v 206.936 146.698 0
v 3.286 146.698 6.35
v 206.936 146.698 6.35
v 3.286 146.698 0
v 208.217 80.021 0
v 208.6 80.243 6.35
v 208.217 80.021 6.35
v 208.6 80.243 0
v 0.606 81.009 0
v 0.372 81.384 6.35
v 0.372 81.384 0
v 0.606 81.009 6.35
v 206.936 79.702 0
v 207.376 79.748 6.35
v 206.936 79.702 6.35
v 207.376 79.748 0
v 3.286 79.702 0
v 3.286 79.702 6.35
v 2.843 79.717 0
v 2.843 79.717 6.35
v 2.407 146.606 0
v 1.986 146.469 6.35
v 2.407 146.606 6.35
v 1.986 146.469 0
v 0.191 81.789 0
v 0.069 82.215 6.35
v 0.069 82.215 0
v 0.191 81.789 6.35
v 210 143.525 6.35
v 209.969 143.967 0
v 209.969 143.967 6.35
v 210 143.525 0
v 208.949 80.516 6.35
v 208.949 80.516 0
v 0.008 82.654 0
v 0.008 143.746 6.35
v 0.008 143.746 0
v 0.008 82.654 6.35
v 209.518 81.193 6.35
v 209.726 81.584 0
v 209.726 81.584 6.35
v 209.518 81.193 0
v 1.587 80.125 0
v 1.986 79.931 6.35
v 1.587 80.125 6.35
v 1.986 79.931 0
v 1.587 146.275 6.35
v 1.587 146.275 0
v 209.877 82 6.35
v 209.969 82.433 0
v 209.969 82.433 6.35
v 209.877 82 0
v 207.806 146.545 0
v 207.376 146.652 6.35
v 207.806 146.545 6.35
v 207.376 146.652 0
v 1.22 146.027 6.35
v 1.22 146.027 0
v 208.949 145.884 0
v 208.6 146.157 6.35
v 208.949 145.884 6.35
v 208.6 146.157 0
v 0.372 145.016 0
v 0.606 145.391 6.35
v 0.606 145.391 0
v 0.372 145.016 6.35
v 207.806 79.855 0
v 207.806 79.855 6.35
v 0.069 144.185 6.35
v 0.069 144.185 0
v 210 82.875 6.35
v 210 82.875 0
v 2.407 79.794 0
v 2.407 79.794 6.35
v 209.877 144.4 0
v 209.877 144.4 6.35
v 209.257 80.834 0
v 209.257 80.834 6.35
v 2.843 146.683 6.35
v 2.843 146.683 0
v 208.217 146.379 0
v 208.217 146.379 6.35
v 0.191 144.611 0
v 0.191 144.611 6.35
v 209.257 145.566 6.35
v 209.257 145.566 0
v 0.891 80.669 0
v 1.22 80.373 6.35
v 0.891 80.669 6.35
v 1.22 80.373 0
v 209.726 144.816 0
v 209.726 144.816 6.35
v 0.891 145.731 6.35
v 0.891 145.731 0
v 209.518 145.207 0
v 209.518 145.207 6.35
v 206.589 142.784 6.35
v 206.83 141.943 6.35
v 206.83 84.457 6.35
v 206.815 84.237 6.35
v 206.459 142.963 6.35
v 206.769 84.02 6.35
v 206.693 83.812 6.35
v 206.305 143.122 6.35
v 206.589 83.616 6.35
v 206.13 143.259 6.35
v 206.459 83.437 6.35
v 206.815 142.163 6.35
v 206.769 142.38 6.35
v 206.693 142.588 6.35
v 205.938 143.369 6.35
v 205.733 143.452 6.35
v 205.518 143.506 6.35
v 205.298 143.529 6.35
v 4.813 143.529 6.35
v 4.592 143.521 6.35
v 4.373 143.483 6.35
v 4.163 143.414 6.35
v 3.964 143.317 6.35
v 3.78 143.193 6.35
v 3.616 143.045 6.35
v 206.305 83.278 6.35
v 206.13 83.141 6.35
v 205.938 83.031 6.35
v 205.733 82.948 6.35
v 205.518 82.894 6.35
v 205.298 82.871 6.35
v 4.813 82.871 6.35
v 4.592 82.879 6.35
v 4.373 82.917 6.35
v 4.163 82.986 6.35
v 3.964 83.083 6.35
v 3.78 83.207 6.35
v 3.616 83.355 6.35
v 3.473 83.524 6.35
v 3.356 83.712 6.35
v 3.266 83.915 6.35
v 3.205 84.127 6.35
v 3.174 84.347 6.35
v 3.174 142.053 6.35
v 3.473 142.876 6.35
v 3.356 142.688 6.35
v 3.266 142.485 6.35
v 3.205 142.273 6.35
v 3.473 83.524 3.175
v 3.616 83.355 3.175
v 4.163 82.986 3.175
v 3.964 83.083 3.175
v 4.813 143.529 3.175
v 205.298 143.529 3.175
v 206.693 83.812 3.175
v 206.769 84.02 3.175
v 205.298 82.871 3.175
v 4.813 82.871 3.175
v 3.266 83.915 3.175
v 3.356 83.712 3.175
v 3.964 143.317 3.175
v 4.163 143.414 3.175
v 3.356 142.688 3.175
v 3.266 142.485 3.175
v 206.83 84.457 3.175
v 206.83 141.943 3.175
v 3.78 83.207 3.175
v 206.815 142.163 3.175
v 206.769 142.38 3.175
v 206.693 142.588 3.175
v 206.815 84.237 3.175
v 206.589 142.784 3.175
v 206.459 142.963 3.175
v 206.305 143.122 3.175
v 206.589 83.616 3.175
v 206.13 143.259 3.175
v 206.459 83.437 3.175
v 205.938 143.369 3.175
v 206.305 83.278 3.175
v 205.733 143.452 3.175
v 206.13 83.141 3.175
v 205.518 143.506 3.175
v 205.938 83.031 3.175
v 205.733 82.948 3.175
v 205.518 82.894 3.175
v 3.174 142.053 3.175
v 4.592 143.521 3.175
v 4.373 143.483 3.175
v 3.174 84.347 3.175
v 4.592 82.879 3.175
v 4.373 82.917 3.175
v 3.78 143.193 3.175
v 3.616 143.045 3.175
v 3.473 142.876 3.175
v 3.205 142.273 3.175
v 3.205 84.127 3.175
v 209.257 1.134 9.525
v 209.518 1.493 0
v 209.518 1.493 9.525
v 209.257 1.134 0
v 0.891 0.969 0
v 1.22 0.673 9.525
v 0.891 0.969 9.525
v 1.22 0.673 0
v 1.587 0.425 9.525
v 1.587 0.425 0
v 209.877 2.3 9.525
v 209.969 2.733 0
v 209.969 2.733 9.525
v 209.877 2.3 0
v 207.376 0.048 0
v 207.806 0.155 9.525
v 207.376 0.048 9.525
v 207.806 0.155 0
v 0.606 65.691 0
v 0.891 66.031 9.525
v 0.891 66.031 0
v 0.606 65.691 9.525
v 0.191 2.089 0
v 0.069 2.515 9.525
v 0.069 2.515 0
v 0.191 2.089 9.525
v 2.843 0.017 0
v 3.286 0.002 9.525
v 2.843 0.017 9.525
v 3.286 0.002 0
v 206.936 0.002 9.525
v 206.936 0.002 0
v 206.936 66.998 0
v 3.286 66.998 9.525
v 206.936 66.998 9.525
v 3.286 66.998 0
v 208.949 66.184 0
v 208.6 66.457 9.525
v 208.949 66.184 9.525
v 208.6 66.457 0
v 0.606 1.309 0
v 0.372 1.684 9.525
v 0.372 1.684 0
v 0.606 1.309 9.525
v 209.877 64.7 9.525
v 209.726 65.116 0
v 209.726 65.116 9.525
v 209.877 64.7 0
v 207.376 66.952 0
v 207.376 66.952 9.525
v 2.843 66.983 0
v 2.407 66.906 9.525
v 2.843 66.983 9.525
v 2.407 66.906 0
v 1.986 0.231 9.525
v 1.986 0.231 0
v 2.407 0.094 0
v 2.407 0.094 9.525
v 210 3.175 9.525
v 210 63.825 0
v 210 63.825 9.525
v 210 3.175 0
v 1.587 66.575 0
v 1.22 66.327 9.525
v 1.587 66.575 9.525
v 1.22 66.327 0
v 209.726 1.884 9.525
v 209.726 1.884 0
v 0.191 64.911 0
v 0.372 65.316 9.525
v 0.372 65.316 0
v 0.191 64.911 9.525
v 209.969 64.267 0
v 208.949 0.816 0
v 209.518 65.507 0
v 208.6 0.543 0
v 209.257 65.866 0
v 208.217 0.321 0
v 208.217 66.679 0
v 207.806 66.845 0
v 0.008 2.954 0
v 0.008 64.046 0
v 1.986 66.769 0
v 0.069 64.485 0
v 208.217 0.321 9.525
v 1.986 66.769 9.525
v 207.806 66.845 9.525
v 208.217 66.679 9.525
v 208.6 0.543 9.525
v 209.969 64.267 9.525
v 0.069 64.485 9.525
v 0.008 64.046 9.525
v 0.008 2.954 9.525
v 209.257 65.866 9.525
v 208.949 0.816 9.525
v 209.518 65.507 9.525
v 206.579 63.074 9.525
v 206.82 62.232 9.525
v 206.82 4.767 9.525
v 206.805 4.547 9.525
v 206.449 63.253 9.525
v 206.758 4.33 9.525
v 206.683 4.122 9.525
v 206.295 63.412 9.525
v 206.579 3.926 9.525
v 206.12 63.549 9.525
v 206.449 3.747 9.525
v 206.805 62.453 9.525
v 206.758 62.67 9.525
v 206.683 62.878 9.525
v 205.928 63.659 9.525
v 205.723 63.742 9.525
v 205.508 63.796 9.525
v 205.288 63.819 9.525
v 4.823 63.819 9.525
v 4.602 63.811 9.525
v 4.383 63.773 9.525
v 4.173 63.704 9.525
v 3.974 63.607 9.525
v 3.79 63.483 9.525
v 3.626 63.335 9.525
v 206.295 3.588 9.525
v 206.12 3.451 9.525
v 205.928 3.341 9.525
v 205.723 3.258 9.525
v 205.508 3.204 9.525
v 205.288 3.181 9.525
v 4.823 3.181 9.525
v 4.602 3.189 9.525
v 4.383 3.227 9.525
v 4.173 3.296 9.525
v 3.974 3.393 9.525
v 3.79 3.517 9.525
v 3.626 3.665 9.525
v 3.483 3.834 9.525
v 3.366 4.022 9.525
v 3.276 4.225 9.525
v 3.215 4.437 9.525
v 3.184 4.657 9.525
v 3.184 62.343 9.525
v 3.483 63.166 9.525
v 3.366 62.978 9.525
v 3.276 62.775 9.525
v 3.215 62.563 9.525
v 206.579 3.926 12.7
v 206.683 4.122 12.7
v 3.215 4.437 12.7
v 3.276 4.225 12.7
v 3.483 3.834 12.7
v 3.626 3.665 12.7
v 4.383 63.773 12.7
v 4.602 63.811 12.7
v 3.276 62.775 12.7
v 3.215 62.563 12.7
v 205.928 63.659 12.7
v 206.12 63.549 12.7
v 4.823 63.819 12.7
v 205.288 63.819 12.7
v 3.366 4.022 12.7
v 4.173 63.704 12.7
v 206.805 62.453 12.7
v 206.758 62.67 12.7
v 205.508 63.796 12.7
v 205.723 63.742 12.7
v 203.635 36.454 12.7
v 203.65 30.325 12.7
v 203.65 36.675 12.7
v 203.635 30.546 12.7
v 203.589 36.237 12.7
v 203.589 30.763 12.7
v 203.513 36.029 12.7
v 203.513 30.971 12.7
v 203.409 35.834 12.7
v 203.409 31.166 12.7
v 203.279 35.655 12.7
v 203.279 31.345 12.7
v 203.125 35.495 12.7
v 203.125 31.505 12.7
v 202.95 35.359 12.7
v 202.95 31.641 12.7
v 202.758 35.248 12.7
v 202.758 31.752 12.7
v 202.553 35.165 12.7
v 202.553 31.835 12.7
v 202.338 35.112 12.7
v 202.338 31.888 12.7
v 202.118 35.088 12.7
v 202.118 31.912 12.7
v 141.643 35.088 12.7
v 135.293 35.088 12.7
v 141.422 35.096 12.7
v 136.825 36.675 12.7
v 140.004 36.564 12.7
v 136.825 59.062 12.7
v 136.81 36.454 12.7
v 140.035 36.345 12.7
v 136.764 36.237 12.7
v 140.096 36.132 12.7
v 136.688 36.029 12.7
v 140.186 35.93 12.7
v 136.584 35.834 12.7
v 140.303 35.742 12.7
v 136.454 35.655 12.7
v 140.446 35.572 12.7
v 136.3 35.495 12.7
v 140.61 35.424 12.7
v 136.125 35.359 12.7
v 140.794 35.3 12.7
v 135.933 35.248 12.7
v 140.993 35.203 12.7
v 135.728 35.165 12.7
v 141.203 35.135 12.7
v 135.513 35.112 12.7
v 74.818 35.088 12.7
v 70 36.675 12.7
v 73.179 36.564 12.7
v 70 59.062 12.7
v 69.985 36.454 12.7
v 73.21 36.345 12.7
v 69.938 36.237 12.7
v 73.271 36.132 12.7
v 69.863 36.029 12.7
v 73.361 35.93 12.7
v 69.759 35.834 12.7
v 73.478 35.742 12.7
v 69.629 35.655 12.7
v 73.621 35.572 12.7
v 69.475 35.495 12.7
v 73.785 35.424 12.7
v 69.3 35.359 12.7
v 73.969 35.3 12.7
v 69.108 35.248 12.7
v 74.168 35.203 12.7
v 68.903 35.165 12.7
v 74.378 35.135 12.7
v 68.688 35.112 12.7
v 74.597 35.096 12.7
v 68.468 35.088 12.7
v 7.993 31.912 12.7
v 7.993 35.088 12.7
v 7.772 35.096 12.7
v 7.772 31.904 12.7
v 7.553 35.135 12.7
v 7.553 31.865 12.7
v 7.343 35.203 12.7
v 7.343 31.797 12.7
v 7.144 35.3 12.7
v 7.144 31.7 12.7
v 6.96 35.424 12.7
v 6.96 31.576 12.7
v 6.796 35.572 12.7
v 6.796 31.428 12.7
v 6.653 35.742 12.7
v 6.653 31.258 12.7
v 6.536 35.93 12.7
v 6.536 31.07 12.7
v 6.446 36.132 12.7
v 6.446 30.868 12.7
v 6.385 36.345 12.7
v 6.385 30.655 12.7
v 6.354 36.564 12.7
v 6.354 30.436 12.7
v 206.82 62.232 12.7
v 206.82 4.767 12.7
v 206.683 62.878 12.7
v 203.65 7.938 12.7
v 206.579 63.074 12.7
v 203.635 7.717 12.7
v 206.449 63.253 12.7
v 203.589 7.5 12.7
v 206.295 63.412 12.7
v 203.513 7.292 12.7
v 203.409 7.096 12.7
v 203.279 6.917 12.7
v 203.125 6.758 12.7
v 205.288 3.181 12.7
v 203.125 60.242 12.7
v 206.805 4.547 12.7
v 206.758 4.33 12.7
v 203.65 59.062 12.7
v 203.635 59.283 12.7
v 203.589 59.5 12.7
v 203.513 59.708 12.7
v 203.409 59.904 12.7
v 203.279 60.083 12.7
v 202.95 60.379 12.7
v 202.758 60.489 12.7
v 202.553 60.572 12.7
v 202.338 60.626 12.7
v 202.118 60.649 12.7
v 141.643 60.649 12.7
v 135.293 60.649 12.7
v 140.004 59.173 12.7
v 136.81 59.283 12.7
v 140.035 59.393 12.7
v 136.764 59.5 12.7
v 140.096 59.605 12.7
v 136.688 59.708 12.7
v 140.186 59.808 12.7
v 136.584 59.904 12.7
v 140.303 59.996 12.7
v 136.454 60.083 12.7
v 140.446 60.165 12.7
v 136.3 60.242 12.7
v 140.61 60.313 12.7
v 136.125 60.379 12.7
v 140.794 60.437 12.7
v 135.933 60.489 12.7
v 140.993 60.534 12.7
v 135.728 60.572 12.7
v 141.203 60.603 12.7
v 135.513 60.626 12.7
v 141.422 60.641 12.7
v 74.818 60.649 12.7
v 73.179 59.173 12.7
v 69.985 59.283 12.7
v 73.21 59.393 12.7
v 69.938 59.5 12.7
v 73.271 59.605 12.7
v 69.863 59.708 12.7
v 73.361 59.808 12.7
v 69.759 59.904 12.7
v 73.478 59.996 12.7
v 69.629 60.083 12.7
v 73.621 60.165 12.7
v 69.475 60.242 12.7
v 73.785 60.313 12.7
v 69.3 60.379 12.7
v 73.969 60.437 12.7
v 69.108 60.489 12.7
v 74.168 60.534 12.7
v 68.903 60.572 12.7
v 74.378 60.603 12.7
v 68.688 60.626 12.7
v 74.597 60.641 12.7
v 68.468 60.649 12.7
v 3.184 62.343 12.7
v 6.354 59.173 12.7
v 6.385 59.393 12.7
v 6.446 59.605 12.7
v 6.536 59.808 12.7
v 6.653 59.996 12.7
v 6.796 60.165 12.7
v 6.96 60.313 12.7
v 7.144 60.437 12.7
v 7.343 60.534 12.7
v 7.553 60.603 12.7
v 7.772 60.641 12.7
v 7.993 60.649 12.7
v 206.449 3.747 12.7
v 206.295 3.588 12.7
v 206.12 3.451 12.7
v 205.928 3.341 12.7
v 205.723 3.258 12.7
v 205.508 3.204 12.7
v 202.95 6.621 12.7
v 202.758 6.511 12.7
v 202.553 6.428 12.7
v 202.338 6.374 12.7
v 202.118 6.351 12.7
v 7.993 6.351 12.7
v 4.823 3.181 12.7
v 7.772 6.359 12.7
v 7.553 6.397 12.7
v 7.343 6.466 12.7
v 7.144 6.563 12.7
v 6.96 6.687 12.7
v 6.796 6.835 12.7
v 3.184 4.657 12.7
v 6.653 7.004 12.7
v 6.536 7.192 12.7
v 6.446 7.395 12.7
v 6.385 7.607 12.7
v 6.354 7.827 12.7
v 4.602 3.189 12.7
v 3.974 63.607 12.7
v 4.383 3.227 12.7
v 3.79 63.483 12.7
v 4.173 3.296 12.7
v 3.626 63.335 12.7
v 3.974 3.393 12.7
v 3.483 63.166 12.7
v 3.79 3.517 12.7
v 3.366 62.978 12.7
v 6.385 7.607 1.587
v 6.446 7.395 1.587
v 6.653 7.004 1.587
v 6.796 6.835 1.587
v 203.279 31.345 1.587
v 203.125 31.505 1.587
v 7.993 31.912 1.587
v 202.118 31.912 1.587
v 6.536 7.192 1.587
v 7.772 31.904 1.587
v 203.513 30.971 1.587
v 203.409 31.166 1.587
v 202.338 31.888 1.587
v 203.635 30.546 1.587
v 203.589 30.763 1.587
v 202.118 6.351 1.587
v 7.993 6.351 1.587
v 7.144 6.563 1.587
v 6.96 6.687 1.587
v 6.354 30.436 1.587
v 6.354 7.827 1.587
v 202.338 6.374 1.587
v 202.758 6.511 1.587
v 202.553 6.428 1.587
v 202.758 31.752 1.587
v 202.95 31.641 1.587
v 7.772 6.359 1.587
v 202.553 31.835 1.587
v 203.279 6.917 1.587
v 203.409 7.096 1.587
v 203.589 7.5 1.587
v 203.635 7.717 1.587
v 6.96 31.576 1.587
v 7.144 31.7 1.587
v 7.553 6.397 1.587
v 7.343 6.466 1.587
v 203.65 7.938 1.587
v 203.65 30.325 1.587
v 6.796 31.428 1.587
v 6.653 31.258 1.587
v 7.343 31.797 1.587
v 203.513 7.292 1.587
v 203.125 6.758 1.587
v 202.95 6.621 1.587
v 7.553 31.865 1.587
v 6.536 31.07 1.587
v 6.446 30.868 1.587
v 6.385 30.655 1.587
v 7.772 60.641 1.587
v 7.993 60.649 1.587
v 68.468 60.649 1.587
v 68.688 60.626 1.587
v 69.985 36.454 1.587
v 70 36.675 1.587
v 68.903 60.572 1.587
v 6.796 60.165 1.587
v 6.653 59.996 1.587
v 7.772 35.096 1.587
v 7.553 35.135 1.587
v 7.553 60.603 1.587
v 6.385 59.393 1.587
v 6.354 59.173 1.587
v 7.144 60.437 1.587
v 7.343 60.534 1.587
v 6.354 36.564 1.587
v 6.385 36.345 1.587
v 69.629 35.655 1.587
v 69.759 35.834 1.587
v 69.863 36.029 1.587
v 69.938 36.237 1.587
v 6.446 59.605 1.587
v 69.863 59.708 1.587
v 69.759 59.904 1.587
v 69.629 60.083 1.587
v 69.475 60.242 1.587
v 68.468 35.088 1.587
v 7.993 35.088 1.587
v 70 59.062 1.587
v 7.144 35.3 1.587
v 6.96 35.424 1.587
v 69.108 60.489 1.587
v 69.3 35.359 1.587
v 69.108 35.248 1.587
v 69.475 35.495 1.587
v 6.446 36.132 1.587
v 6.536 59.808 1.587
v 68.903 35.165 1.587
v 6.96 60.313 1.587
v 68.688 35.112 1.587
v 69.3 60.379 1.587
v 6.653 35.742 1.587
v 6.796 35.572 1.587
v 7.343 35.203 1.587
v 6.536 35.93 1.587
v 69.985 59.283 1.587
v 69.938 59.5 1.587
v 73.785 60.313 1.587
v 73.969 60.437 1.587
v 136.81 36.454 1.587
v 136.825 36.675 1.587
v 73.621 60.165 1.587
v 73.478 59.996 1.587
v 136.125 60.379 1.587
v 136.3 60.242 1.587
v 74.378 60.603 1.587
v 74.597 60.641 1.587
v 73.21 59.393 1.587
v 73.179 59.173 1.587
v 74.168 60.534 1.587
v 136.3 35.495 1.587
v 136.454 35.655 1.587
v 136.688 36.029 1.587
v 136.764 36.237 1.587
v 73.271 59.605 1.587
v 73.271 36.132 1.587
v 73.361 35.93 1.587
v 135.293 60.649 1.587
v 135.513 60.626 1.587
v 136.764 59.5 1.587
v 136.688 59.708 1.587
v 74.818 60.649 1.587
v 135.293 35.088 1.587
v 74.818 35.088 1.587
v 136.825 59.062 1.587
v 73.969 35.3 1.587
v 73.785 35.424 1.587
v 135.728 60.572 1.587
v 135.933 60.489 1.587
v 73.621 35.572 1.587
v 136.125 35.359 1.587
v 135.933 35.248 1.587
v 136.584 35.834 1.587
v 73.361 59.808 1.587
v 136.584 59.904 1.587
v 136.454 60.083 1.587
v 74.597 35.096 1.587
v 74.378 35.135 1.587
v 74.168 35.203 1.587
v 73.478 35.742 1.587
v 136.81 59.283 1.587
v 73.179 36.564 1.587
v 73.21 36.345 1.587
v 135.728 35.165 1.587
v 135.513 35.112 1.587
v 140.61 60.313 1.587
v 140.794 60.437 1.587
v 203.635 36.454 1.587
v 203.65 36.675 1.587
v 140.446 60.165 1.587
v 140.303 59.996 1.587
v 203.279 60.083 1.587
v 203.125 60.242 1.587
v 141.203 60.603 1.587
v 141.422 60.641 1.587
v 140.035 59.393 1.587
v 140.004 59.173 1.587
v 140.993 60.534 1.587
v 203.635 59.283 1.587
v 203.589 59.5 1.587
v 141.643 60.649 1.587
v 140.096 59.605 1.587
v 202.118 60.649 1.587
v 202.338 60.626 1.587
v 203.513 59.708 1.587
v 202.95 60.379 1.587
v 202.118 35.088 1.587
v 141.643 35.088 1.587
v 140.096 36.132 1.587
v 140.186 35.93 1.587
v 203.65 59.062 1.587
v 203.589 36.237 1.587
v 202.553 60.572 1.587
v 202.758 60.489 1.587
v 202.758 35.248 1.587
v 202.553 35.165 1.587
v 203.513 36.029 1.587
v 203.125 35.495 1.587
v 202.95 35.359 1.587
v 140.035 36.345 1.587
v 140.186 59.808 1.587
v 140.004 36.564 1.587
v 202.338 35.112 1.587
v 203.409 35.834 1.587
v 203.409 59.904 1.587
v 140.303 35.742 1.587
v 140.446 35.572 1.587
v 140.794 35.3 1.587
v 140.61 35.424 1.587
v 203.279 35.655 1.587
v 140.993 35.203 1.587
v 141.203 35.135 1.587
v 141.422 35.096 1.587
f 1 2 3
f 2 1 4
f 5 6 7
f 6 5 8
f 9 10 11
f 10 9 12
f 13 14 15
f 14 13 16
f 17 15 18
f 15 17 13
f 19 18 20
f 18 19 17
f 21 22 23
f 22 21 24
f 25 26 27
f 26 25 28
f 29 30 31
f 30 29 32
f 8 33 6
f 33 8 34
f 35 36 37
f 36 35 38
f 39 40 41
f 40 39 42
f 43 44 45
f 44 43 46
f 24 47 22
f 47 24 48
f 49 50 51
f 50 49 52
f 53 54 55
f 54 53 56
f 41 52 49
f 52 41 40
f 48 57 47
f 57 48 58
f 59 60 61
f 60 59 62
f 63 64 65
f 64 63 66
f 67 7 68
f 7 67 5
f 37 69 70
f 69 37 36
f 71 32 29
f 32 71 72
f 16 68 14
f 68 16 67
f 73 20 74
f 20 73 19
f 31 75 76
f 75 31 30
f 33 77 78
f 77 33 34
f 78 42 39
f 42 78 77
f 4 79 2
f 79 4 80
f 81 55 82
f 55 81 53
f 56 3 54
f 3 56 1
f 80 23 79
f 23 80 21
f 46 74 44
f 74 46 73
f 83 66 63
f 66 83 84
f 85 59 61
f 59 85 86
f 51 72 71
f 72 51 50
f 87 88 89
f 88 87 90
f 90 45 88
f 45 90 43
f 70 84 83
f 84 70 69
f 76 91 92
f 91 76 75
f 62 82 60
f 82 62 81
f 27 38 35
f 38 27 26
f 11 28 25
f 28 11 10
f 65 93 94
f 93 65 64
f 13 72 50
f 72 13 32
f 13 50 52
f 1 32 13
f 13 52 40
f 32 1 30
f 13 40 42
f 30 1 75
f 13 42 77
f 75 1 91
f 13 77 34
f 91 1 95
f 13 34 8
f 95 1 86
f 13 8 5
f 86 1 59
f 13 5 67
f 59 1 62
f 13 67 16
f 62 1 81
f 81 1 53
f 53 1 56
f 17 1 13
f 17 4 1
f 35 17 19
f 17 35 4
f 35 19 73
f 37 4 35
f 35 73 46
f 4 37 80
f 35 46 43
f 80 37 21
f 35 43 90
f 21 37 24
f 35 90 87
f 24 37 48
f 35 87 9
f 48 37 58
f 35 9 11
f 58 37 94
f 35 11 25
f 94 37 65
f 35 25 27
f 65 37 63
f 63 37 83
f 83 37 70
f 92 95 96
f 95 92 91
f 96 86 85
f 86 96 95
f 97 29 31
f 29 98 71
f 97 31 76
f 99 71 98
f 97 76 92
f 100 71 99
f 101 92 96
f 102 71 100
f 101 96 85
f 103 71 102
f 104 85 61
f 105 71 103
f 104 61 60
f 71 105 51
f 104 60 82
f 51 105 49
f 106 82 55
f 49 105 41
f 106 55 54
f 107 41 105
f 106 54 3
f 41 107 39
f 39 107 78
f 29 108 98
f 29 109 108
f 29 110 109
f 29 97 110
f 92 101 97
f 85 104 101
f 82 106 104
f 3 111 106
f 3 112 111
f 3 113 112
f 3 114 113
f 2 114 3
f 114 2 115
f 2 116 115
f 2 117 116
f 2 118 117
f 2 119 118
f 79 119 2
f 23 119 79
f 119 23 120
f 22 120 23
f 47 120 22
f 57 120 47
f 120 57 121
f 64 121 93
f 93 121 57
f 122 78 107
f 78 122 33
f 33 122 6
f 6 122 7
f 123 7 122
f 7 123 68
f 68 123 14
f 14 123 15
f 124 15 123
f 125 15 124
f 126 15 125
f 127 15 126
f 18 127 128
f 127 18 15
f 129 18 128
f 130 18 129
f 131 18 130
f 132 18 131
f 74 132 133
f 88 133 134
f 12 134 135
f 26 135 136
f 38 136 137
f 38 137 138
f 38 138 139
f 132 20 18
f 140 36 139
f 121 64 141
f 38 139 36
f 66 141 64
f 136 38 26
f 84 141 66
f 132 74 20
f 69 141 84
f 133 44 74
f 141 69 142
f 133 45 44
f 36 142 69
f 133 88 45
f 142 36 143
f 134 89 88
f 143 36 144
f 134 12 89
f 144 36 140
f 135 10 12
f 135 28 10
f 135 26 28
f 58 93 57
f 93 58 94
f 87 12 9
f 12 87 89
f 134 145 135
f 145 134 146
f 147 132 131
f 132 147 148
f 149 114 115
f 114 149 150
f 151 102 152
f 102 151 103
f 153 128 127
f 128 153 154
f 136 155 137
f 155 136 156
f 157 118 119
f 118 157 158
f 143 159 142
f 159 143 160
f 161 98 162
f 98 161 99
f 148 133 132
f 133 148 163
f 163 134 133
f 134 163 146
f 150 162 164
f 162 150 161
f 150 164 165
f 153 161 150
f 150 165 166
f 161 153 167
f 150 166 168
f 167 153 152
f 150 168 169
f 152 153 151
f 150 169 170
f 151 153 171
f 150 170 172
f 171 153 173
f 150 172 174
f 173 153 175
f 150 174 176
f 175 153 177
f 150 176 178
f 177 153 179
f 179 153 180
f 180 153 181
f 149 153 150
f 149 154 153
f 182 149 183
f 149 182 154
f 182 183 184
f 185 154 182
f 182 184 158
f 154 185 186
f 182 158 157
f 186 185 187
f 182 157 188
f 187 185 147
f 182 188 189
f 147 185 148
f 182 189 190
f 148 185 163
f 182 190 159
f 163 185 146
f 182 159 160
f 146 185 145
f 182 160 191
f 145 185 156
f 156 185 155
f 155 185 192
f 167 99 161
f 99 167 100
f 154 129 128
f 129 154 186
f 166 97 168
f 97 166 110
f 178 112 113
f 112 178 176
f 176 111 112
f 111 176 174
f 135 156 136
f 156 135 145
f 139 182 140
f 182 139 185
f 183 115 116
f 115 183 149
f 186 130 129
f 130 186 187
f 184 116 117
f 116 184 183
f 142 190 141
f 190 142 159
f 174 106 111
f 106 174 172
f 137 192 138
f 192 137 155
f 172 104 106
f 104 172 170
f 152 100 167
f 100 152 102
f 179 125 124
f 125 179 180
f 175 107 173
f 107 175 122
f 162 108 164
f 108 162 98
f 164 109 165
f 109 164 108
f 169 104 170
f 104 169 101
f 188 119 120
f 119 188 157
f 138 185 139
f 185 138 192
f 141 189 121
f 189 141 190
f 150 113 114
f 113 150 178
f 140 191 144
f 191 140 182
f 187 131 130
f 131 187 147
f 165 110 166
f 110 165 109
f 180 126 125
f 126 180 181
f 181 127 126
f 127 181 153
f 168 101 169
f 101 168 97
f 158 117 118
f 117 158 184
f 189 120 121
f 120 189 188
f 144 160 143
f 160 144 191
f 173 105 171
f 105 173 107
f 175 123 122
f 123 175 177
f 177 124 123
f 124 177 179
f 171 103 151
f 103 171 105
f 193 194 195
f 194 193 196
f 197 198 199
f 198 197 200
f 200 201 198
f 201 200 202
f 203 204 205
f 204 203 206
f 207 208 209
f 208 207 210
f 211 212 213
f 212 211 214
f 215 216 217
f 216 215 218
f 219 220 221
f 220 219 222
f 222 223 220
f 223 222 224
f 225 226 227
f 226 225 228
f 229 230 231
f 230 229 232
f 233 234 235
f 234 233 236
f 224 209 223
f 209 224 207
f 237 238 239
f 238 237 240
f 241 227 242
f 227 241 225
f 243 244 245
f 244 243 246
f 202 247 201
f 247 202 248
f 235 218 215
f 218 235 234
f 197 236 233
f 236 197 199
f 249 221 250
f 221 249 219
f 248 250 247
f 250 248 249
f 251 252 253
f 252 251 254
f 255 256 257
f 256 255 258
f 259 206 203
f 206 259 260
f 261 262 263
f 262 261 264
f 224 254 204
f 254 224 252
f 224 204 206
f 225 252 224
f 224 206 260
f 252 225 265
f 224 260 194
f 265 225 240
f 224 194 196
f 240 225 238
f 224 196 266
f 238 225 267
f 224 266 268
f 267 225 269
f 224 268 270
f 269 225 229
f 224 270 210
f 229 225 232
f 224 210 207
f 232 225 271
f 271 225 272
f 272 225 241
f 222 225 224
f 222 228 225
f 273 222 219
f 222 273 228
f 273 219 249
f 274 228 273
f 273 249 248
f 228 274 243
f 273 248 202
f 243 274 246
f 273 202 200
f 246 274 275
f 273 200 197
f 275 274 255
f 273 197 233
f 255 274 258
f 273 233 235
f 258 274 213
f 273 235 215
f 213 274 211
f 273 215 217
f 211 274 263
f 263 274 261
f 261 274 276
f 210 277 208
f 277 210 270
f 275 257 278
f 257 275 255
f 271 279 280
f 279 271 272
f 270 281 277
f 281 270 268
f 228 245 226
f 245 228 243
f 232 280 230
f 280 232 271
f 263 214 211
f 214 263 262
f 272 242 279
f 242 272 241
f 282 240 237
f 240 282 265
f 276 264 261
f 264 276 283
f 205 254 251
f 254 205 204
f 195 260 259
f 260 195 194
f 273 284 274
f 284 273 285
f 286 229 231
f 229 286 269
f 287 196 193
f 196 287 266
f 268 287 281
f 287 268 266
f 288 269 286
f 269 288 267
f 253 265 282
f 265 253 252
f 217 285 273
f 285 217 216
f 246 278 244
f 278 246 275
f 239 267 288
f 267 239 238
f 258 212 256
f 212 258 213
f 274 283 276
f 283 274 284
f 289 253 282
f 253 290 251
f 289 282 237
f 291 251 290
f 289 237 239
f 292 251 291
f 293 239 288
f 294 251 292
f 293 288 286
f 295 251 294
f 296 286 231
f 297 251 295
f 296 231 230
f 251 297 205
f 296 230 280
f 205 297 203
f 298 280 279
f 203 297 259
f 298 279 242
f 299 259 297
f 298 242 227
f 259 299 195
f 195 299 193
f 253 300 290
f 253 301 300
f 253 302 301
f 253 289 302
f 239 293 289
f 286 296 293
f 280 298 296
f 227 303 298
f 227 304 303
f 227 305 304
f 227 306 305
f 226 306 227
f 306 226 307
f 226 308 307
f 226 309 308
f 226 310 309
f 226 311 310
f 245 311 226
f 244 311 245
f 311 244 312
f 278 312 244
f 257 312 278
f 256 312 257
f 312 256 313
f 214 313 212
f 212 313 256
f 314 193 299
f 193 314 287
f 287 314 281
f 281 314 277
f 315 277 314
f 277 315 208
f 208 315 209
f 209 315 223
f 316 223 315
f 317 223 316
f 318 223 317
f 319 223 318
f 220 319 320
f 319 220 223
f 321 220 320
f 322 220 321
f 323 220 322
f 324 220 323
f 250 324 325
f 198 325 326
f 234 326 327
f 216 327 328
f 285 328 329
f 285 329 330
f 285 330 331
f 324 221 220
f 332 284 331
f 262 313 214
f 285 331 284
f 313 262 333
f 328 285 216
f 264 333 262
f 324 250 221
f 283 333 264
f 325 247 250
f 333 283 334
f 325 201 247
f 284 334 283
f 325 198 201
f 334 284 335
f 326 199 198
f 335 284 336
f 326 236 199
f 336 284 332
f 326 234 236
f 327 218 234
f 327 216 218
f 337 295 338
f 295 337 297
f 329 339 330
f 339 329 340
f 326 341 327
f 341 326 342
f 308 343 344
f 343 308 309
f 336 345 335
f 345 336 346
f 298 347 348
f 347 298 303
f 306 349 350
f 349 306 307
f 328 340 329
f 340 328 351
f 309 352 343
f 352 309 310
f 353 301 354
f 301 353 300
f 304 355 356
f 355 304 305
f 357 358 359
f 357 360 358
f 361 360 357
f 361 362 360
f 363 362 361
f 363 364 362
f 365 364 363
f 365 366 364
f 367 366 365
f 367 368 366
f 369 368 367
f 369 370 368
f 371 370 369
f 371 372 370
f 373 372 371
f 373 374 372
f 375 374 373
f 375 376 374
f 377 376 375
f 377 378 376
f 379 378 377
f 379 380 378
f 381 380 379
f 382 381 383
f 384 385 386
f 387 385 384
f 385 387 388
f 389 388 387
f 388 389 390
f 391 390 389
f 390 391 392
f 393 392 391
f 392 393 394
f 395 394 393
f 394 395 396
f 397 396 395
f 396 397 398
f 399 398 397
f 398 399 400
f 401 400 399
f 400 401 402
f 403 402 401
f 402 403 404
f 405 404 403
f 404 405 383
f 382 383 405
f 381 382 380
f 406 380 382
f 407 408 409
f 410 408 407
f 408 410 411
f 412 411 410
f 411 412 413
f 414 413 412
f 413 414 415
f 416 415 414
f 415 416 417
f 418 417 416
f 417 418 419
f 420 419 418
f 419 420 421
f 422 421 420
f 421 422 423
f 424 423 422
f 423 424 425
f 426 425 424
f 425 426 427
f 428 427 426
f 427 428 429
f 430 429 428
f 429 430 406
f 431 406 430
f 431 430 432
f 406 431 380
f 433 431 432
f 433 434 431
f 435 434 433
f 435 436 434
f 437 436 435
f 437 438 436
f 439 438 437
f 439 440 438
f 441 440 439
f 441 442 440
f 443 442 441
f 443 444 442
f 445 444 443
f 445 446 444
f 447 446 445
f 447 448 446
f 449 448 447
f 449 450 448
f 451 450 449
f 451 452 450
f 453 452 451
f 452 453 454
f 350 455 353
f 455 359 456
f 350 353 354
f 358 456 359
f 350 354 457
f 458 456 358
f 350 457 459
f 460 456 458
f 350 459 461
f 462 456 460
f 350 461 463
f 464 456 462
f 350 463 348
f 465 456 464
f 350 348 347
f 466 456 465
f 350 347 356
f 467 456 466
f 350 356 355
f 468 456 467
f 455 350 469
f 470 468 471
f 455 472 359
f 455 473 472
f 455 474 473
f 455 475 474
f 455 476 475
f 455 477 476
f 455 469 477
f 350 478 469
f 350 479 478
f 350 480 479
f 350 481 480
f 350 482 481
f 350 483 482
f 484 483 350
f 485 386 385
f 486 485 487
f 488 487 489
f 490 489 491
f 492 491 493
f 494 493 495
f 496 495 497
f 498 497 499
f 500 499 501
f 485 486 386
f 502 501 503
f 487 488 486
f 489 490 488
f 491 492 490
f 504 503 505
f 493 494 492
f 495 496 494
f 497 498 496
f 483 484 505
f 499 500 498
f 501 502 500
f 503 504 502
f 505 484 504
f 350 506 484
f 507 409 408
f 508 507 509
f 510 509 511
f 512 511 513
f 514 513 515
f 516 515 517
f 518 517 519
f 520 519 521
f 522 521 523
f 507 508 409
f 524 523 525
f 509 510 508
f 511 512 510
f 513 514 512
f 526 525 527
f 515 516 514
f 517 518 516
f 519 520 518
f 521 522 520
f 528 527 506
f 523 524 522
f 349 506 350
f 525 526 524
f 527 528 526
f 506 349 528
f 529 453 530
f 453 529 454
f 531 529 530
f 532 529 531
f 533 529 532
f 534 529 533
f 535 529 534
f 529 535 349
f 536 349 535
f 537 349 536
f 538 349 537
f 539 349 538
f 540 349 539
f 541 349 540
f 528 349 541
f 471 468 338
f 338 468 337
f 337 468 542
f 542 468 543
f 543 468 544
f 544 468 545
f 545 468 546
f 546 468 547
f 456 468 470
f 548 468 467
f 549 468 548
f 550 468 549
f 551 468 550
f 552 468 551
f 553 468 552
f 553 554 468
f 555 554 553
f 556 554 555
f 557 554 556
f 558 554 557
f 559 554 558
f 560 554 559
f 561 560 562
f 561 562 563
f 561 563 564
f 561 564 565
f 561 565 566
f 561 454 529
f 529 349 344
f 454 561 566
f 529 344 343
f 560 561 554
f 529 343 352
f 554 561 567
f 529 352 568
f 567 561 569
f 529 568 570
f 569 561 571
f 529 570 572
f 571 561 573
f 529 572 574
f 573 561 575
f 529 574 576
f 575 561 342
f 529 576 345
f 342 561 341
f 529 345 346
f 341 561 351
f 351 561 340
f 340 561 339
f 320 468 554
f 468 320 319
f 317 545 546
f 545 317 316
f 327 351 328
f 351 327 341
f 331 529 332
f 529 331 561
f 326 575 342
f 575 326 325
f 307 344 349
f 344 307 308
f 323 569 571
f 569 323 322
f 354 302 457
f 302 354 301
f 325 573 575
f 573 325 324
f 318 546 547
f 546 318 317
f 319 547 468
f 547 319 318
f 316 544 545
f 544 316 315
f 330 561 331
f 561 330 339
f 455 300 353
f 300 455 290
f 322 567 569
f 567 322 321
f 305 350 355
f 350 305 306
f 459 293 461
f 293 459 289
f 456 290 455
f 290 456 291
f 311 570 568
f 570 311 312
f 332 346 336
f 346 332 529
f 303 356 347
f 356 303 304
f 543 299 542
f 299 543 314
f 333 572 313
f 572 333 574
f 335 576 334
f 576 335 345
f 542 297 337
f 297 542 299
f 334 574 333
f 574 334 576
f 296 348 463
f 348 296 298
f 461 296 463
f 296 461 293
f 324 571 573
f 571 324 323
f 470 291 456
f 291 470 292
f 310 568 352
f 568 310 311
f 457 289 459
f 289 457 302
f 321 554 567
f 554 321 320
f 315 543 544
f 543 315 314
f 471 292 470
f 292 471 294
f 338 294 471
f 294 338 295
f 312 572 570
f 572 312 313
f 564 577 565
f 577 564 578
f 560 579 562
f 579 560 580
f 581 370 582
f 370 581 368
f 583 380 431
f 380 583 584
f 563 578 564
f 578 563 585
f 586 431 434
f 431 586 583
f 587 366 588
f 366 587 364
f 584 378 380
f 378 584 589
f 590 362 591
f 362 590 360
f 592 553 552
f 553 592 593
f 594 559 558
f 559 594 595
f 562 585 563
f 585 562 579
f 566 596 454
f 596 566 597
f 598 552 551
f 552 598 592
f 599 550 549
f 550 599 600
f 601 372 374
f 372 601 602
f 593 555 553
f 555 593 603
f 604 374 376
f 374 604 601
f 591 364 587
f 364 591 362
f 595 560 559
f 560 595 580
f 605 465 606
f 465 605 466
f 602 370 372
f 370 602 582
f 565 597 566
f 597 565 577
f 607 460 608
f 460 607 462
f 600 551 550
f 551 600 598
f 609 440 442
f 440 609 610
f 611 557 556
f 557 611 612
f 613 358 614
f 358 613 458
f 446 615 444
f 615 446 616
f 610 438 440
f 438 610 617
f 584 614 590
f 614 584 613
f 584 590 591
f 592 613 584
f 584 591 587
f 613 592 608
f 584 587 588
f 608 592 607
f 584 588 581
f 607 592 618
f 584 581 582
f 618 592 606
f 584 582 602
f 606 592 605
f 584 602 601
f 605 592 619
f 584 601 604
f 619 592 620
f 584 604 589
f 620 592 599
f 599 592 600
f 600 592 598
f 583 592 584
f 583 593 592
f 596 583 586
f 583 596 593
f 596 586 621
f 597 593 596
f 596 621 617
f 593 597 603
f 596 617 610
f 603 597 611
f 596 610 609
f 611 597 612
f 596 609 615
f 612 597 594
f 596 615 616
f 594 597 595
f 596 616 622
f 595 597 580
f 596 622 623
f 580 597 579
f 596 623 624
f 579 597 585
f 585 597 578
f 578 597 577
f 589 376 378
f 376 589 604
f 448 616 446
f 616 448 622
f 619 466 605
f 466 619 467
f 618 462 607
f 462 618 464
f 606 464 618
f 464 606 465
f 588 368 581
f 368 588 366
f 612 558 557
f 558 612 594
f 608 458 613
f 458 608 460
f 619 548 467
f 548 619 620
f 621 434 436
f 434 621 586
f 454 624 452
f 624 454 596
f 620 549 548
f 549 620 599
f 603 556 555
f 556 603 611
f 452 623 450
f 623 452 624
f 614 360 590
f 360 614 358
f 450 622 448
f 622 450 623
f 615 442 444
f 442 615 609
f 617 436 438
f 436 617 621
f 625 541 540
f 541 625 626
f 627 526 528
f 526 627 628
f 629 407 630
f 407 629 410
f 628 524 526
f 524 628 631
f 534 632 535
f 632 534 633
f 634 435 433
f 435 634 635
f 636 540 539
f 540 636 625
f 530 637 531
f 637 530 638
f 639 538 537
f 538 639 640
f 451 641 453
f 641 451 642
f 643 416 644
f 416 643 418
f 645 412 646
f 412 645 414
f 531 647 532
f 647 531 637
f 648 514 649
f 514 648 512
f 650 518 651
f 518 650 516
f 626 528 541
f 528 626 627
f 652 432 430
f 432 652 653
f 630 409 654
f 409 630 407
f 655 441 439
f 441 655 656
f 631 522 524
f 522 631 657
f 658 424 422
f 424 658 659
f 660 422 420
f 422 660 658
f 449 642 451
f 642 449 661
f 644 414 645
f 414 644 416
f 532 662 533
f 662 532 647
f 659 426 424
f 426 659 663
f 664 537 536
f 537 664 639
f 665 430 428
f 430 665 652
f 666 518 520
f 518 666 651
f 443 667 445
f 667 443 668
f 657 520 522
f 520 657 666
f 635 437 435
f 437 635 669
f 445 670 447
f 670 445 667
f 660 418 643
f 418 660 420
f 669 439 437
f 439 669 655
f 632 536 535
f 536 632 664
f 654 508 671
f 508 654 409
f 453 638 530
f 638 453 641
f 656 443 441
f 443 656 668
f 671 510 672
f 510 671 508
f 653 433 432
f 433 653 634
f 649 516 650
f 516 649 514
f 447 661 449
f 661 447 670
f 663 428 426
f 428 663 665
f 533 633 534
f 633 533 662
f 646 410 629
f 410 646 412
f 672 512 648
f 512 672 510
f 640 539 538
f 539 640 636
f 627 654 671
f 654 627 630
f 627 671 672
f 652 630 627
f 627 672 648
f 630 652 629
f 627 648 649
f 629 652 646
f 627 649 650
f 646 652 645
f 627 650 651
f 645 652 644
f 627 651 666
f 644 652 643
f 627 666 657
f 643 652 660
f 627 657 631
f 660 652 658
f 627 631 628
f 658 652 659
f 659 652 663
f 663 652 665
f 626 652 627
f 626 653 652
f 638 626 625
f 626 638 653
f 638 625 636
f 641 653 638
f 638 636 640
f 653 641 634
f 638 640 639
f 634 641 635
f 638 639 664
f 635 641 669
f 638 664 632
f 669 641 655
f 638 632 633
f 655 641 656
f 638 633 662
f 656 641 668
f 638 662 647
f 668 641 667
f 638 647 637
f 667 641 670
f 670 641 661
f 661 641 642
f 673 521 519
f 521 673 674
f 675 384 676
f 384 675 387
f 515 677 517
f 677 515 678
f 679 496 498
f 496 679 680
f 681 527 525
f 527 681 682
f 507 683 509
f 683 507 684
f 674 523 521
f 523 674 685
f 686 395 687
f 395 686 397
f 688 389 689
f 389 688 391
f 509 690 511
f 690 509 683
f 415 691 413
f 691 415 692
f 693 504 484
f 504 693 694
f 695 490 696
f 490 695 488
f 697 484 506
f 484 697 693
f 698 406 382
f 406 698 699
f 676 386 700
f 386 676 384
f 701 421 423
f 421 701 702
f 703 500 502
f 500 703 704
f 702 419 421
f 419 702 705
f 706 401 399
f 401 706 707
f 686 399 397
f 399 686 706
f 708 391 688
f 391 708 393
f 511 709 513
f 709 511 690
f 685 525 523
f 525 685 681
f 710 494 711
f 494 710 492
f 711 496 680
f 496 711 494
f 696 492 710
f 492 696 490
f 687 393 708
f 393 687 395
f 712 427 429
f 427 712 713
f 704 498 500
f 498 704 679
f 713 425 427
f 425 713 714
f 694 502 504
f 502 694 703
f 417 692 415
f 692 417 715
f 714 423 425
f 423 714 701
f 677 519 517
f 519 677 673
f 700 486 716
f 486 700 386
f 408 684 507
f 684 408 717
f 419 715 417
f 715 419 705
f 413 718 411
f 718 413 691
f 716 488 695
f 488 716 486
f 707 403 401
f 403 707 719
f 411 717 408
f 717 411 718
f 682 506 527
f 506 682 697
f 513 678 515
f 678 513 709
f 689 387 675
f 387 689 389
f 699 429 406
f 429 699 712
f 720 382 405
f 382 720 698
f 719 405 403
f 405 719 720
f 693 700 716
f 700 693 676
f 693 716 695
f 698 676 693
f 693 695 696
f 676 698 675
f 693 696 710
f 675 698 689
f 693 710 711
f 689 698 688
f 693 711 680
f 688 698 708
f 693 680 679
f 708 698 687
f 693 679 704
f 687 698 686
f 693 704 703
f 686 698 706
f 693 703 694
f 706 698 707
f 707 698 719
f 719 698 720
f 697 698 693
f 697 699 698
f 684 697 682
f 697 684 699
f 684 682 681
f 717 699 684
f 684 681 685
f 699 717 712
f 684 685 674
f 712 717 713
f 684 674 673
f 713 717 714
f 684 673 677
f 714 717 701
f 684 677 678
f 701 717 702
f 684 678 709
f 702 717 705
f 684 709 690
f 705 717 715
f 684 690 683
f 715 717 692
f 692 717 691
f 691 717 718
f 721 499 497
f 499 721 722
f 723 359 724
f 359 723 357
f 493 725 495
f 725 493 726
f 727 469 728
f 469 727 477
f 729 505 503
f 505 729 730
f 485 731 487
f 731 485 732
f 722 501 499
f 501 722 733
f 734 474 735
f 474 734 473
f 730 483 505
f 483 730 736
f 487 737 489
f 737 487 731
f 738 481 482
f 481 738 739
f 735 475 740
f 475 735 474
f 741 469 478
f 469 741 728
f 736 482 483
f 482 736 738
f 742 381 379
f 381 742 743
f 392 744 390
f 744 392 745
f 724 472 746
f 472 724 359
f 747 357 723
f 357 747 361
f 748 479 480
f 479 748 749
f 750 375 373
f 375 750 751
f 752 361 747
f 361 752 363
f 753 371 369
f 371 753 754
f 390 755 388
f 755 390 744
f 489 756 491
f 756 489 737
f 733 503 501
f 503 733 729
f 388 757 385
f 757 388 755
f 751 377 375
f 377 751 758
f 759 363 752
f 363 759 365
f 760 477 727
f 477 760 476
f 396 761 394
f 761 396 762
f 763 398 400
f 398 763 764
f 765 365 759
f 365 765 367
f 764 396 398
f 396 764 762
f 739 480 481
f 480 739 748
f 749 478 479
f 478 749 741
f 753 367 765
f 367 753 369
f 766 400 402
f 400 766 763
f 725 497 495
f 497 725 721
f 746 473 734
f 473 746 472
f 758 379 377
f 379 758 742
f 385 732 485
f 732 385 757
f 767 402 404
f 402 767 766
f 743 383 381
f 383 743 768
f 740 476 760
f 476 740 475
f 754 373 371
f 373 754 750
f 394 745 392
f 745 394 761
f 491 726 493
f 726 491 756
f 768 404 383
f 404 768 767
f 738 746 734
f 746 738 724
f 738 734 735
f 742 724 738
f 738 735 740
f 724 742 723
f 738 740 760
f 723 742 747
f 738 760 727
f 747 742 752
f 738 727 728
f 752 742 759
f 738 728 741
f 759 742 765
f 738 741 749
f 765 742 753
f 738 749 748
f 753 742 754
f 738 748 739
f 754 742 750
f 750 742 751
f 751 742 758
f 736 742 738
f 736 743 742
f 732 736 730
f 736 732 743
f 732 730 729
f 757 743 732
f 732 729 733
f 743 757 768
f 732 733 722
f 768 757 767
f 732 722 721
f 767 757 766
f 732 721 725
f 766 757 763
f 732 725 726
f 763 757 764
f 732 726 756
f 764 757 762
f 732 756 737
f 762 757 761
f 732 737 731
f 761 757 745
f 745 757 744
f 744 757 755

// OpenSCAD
//!OpenSCAD
//
// Please use the Customizer to interact with this (if necessary, show it by clearing the checkbox in front of View | Hide Customizer), and close this Editor window.
// * [Overview] *
// Part
PARTNO = 0;// [0:All, 1:Top, 2:Bottom]

partspacing = 12.7;

Generate_DXF_or_STL = 2;//[1:DXF,2:STL]

$fn=45;

// Type of Corner
Boxshape = 0; //[1:Square, 0:Rounded]
Width = 210;
Length = 67;
Height = 12.7;
Thickness = 6.35;

/* [Dividers] */
// Thickness
dividers_thickness = 3.175;
// Number of dividers widthwise
dividers_widthwise = 2;
// Number of dividers lengthwise
dividers_lengthwise = 1;
// Large Compartment
largecompartment = 2;// [0:None,1:Lengthwise, 2:Widthwise, 0:None]

/* [Endmill Parameters] */
// Shape
endmillshape = 1;// [0:Ball, 1:Square]
diameter = 3.175;
depth = 25.4;

Clearance = 0.01;
module endmillcut(emcshape, emcdiameter, emcdepth) {
  emcshape = emcshape;
  emcdiameter = emcdiameter;
  emcdepth = emcdepth;
  emcradius = emcdiameter / 2;
  if (emcshape == 0) {
    emcadjdepth = emcdepth - emcradius;
    union(){
      translate([0, 0, emcradius]){
        sphere(r=emcradius);
      }
      translate([0, 0, emcradius]){
        cylinder(r1=emcradius, r2=emcradius, h=emcadjdepth, center=false);
      }
    }
  } else if (emcshape == 1) {
    translate([0, 0, 0]){
      cylinder(r1=emcradius, r2=emcradius, h=emcdepth, center=false);
    }
  }

}

module fittedbox() {
if (Generate_DXF_or_STL == 2) {
  if (PARTNO == 1) {
    lid();
  } else if (PARTNO == 2) {
    box();
  } else {
    union(){
      lid();
      box();
    }
  }
}
if (Generate_DXF_or_STL == 1) {
projection(cut = true)
{
translate([0,0,-Thickness*0.9]) lid();
translate([0,0,-Thickness*1.1]) box();
}
}
}

module lid() {
  translate([0, (Length + partspacing), 0]){
    difference() {
      if (Boxshape == 0) {
        pocketrect(0, 0, 0, 1, Thickness, Length, Width, Thickness);
      } else {
        cube([Width, Length, Thickness], center=false);
      }

      pocketrect(Thickness / 2 - halfclearance, Thickness / 2 - halfclearance, halfthickness, 1, halfthickness, (Length - Thickness) + halfclearance * 2, (Width - Thickness) + halfclearance * 2, Height);
    }
  }
}

module pocketrect(px, py, pbottom, endmillshape, pdiameter, plength, pwidth, pdepth) {
  pradius = pdiameter / 2;
  translate([px, py, pbottom]){
    hull(){
      translate([pradius, pradius, 0]){
        endmillcut(endmillshape, pdiameter, pdepth);
      }
      translate([(pwidth - pradius), pradius, 0]){
        endmillcut(endmillshape, pdiameter, pdepth);
      }
      translate([(pwidth - pradius), (plength - pradius), 0]){
        endmillcut(endmillshape, pdiameter, pdepth);
      }
      translate([pradius, (plength - pradius), 0]){
        endmillcut(endmillshape, pdiameter, pdepth);
      }
    }
  }
}

module box() {
  difference() {
    union(){
      if (Boxshape == 0) {
        pocketrect(0, 0, 0, 1, Thickness, Length, Width, Height - halfthickness);
      } else {
        cube([Width, Length, (Height - halfthickness)], center=false);
      }

      pocketrect(Thickness / 2 + halfclearance, Thickness / 2 + halfclearance, halfthickness, 1, halfthickness, (Length - Thickness) - halfclearance * 2, (Width - Thickness) - halfclearance * 2, Height - halfthickness);
    }

    for (i = [0 : abs(1) : dividers_widthwise]) {
      for (j = [0 : abs(1) : dividers_lengthwise]) {
        if (largecompartment == 1 && (i % 2 == 1 && j == 0)) {
          pocketrect((Thickness + pcwidth * i) + dividers_thickness * (i + 0), (Thickness + pclength * j) + dividers_thickness * (j + 0), radius, endmillshape, diameter, intlength, pcwidth, Height);
        } else if (largecompartment == 2 && (j % 2 == 0 && i == 0)) {
          pocketrect((Thickness + pcwidth * i) + dividers_thickness * (i + 0), (Thickness + pclength * j) + dividers_thickness * (j + 0), radius, endmillshape, diameter, pclength, intwidth, Height);
        } else {
          pocketrect((Thickness + pcwidth * i) + dividers_thickness * (i + 0), (Thickness + pclength * j) + dividers_thickness * (j + 0), radius, endmillshape, diameter, pclength, pcwidth, Height);
        }

      }

    }

  }
}

halfthickness = Thickness / 2;
quarterthickness = Thickness / 4;
radius = diameter / 2;
adjdepth = depth - radius;
intwidth = Width - Thickness * 2;
intlength = Length - Thickness * 2;
pcwidth = (intwidth - dividers_thickness * dividers_widthwise) / (dividers_widthwise + 1);
pclength = (intlength - dividers_thickness * dividers_lengthwise) / (dividers_lengthwise + 1);
halfclearance = Clearance / 2;


fittedbox();
